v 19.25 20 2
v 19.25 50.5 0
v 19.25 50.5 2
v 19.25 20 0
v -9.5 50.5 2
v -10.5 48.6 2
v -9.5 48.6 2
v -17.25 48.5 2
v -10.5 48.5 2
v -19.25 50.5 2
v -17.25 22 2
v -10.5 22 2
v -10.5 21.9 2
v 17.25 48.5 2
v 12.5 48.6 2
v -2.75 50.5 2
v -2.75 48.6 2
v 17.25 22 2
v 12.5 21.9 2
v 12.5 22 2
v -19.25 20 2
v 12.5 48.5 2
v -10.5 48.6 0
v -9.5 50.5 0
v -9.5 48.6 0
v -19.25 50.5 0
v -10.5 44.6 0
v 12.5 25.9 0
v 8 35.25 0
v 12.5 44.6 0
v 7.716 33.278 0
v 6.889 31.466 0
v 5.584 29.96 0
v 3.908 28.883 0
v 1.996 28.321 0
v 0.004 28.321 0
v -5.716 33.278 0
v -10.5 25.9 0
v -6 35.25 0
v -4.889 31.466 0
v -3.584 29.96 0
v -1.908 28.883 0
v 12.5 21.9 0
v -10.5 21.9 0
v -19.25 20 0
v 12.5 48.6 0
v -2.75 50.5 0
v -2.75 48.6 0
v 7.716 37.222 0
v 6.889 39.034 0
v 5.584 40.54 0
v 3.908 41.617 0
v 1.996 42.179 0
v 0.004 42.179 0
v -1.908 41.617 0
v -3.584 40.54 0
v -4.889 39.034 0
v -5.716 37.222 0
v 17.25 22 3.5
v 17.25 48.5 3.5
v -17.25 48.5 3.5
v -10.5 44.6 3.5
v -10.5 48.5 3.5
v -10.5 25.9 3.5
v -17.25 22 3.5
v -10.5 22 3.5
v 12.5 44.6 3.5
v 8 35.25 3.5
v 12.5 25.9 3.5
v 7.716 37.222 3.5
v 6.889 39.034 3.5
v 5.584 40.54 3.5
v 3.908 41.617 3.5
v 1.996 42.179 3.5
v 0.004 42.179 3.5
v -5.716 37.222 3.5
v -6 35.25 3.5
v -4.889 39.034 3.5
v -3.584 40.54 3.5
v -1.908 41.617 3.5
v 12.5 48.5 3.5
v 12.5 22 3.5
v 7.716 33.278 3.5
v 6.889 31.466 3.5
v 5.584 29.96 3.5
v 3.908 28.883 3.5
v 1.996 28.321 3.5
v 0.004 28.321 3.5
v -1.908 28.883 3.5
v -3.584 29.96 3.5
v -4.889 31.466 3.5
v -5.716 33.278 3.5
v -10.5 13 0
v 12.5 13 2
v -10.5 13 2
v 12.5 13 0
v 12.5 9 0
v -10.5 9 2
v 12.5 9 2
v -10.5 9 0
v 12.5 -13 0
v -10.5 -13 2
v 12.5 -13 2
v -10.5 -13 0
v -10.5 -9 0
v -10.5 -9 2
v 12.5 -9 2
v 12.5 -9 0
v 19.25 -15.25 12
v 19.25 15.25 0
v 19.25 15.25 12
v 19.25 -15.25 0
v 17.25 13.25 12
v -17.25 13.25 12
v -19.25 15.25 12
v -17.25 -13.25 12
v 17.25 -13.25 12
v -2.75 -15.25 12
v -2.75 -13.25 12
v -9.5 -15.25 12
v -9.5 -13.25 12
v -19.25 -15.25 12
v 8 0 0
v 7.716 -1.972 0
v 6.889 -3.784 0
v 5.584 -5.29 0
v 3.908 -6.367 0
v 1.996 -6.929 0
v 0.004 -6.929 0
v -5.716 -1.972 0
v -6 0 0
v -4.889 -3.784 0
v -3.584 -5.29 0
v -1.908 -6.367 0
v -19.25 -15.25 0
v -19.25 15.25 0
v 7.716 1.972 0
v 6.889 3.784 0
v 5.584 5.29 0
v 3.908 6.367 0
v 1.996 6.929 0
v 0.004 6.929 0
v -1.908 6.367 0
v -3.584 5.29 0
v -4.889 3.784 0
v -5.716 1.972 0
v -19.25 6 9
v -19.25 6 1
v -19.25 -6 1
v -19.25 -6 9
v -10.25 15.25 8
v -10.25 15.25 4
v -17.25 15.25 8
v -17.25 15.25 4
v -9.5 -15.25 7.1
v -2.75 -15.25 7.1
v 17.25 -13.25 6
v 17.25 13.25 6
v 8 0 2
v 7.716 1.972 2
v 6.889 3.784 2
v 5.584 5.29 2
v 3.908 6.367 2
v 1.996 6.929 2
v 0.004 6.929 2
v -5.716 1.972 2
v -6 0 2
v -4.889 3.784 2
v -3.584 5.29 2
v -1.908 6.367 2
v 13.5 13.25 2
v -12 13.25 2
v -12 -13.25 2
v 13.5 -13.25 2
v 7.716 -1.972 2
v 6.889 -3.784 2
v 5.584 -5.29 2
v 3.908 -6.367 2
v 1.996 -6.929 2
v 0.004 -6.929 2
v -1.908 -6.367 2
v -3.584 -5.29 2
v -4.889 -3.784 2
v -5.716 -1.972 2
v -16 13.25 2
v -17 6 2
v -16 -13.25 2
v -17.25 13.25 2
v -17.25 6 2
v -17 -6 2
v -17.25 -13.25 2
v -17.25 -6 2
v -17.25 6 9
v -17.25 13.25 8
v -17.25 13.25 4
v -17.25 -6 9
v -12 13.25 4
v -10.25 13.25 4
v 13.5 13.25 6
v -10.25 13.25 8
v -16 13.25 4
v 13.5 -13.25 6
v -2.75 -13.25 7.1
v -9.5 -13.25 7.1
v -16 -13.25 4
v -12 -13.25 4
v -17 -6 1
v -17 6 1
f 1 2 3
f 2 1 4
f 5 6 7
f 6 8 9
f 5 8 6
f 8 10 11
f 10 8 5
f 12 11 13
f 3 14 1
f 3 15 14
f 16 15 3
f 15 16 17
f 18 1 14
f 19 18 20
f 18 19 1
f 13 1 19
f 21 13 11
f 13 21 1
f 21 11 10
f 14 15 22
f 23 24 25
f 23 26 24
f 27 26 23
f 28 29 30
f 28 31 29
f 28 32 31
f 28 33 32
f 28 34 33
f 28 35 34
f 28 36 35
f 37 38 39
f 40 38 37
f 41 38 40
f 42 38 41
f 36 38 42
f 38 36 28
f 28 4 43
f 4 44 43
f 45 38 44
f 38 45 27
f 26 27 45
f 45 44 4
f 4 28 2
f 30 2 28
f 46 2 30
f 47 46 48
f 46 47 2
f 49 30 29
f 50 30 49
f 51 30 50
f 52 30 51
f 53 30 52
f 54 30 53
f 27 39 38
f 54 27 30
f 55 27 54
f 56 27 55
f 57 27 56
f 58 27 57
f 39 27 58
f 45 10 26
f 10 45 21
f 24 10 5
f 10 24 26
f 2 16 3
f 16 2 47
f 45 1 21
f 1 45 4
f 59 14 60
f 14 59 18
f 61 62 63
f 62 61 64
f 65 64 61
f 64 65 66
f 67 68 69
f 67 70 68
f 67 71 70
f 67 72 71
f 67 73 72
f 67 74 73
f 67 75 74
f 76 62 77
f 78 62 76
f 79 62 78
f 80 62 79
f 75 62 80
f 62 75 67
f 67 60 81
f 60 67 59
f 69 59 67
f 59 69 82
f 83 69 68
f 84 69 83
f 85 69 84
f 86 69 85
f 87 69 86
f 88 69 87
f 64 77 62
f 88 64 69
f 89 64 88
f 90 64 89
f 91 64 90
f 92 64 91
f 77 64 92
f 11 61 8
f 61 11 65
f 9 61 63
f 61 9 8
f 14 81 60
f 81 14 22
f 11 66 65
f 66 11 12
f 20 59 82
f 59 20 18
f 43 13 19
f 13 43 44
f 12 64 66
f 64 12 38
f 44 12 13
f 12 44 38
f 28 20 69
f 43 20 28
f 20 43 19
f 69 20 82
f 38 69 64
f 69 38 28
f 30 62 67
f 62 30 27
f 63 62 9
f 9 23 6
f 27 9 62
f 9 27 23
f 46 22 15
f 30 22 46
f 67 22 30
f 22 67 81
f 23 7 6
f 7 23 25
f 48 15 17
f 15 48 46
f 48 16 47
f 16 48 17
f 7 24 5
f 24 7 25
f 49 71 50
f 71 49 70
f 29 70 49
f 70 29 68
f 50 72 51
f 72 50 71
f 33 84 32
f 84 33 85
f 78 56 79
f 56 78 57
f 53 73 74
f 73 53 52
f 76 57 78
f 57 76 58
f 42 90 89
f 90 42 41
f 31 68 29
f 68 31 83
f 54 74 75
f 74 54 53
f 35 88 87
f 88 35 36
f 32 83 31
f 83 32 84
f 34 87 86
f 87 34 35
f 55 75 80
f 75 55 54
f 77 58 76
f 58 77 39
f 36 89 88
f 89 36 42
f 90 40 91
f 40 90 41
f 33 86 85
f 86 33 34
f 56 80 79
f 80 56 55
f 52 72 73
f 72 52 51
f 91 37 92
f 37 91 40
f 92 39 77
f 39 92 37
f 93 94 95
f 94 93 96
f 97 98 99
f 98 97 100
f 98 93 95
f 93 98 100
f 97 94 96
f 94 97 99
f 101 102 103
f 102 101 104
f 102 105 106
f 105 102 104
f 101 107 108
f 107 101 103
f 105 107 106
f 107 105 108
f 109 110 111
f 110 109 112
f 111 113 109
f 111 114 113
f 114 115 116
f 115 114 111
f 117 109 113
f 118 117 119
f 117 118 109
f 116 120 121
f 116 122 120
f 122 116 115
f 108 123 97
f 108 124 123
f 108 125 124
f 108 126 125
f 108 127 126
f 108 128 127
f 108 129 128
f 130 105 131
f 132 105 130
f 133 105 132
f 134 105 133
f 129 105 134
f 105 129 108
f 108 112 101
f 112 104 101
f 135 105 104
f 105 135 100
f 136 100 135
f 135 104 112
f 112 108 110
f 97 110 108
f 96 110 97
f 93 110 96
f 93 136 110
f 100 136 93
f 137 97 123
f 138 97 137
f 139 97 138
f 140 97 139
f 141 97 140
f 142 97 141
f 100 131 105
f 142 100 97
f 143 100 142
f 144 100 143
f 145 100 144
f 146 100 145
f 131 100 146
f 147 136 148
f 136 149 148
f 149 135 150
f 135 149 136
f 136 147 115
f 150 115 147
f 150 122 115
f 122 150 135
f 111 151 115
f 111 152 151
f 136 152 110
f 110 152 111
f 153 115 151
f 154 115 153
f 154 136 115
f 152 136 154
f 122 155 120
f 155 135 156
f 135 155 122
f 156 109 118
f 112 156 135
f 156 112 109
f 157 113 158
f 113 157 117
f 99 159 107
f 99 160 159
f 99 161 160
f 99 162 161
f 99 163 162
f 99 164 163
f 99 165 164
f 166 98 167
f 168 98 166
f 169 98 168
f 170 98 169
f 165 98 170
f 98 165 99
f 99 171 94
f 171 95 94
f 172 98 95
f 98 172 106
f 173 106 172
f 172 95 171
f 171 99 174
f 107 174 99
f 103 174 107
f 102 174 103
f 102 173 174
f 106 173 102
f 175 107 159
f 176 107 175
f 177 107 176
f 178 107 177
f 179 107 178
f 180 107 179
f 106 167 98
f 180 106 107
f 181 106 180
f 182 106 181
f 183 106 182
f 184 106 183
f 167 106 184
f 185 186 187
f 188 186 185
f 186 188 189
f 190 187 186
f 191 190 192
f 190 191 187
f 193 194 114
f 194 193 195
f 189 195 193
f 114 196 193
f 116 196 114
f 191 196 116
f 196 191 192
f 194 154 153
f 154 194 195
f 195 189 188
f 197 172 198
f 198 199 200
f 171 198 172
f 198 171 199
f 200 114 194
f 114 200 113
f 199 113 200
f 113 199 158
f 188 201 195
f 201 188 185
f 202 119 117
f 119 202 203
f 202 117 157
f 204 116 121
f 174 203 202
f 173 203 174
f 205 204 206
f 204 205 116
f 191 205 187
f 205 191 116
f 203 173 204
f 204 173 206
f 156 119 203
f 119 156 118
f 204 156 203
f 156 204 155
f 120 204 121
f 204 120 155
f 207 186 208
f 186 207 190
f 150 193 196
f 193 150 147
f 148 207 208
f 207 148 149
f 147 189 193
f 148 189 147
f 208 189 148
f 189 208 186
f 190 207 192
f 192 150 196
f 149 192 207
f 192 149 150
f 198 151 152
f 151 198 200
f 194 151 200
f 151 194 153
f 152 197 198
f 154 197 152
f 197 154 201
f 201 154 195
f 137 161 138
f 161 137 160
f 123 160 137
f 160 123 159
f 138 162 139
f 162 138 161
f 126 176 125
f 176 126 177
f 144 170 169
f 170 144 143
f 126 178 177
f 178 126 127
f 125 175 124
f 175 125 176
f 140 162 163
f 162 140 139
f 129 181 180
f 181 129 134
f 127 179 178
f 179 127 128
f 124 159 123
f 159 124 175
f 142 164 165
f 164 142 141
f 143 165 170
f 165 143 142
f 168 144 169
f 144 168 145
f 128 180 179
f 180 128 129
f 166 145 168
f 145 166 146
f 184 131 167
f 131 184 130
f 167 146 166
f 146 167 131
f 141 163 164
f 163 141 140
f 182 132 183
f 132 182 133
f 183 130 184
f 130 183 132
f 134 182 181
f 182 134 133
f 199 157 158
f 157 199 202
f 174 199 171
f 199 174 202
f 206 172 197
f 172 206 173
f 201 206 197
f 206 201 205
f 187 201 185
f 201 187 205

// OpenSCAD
height = 12.0;
thickness = 2.0;
fudge = 0.1;
width = 38.5;
depth = 30.50;

cavity_width = width - (2 * thickness);
cavity_depth = depth - (2 * thickness);
cavity_height = height - thickness + fudge;

hole_radius = 7.0;

slit_width = 4.0;
slit_height = 23.0;

ir_hole_width = 6.75;
ir_hole_height = 5;

// ventilation type - only choose one of these, both false yields a circular hole
ventilation_slats = false;
ventilation_rectangle = false;

// These are slots for pin access, incompatible with slats
dev_slots = true;

// lid
difference() {
    union () {
        translate([-(width / 2.0), 20, 0.0]) cube([width, depth, 2.0]);
        translate([-(cavity_width / 2.0), 22, 2.0]) cube([cavity_width, cavity_depth, 1.5]);
    }

    // ir sensor notch
    translate([-9.5, 48.5, 0 - fudge]) cube([ir_hole_width, thickness + fudge, thickness + (fudge * 2)]);

    if (dev_slots) {
        // slot 1
        rotate([0, 0, 90]) translate([21.9, -12.5, 0 - fudge]) cube([slit_width, slit_height, 10]);
        // slot 2
        rotate([0, 0, 90]) translate([44.6, -12.5, 0 - fudge]) cube([slit_width, slit_height, 10]);
    }

    if (ventilation_slats) {
        // ventilation_slats
        translate([12, 22 + (cavity_depth / 2), 2.5]) cube([1,16,6], center = true);
        translate([9, 22 + (cavity_depth / 2), 2.5]) cube([1,16,6], center = true);
        translate([6, 22 + (cavity_depth / 2), 2.5]) cube([1,16,6], center = true);
        translate([3, 22 + (cavity_depth / 2), 2.5]) cube([1,16,6], center = true);
        translate([0, 22 + (cavity_depth / 2), 2.5]) cube([1,16,6], center = true);
    } else if (ventilation_rectangle) {
        // rectangular hole
        translate([1, 22 + (cavity_depth / 2), 2.5]) cube([11,10,6], center = true);
    } else {
        // circular hole
        translate([1, 22 + (cavity_depth / 2), 2.5]) cylinder(h = 5 + fudge, r1 = hole_radius, r2 = hole_radius, center = true);
    }
}

// base
union() {
    translate([13.5, -(cavity_depth / 2.0), 2]) cube([4.0, cavity_depth, 4.0]);
    translate([-16, -(cavity_depth / 2.0), 2]) cube([4.0, cavity_depth, 2.0]);
    difference () {
        translate([0, 0, height / 2.0]) cube([width, depth, height], center = true);
        translate([0, 0, (cavity_height / 2.0) + thickness]) cube([cavity_width, cavity_depth, cavity_height], center = true);

        // side straight out ir sensor
        translate([-9.5, -16, 7 + fudge]) cube([ir_hole_width, 6, ir_hole_height]);

        // power plug hole
        translate([-20, -6, 1]) cube([3, 12, 8]);
        // reset button hole
        translate([-17.25, 13.0, 4]) cube([7, 3, 4]);

        if (dev_slots) {
            // slot 1
            rotate([0, 0, 90]) translate([9, -12.5, 0 - fudge]) cube([slit_width, slit_height, 5]);
            // slot 2
            rotate([0, 0, 90]) translate([-13, -12.5, 0 - fudge]) cube([slit_width, slit_height, 5]);
        }

        if (ventilation_slats) {
             // ventilation_slats
            translate([12, -13.5 + (cavity_depth / 2), 1]) cube([1,16,2 + fudge], center = true);
            translate([9, -13.5 + (cavity_depth / 2), 1]) cube([1,16,2 + fudge], center = true);
            translate([6, -13.5 + (cavity_depth / 2), 1]) cube([1,16,2 + fudge], center = true);
            translate([3, -13.5 + (cavity_depth / 2), 1]) cube([1,16,2 + fudge], center = true);
            translate([0, -13.5 + (cavity_depth / 2), 1]) cube([1,16,2 + fudge], center = true);
        } else if (ventilation_rectangle) {
            // rectangular hole
            translate([1, 0, thickness / 2.0]) cube([11,8,6], center = true);
        } else {
            // circular hole
            translate([1, 0, thickness / 2.0]) cylinder(h = thickness + fudge, r1 = hole_radius, r2 = hole_radius, center = true);
        }
    }
}
